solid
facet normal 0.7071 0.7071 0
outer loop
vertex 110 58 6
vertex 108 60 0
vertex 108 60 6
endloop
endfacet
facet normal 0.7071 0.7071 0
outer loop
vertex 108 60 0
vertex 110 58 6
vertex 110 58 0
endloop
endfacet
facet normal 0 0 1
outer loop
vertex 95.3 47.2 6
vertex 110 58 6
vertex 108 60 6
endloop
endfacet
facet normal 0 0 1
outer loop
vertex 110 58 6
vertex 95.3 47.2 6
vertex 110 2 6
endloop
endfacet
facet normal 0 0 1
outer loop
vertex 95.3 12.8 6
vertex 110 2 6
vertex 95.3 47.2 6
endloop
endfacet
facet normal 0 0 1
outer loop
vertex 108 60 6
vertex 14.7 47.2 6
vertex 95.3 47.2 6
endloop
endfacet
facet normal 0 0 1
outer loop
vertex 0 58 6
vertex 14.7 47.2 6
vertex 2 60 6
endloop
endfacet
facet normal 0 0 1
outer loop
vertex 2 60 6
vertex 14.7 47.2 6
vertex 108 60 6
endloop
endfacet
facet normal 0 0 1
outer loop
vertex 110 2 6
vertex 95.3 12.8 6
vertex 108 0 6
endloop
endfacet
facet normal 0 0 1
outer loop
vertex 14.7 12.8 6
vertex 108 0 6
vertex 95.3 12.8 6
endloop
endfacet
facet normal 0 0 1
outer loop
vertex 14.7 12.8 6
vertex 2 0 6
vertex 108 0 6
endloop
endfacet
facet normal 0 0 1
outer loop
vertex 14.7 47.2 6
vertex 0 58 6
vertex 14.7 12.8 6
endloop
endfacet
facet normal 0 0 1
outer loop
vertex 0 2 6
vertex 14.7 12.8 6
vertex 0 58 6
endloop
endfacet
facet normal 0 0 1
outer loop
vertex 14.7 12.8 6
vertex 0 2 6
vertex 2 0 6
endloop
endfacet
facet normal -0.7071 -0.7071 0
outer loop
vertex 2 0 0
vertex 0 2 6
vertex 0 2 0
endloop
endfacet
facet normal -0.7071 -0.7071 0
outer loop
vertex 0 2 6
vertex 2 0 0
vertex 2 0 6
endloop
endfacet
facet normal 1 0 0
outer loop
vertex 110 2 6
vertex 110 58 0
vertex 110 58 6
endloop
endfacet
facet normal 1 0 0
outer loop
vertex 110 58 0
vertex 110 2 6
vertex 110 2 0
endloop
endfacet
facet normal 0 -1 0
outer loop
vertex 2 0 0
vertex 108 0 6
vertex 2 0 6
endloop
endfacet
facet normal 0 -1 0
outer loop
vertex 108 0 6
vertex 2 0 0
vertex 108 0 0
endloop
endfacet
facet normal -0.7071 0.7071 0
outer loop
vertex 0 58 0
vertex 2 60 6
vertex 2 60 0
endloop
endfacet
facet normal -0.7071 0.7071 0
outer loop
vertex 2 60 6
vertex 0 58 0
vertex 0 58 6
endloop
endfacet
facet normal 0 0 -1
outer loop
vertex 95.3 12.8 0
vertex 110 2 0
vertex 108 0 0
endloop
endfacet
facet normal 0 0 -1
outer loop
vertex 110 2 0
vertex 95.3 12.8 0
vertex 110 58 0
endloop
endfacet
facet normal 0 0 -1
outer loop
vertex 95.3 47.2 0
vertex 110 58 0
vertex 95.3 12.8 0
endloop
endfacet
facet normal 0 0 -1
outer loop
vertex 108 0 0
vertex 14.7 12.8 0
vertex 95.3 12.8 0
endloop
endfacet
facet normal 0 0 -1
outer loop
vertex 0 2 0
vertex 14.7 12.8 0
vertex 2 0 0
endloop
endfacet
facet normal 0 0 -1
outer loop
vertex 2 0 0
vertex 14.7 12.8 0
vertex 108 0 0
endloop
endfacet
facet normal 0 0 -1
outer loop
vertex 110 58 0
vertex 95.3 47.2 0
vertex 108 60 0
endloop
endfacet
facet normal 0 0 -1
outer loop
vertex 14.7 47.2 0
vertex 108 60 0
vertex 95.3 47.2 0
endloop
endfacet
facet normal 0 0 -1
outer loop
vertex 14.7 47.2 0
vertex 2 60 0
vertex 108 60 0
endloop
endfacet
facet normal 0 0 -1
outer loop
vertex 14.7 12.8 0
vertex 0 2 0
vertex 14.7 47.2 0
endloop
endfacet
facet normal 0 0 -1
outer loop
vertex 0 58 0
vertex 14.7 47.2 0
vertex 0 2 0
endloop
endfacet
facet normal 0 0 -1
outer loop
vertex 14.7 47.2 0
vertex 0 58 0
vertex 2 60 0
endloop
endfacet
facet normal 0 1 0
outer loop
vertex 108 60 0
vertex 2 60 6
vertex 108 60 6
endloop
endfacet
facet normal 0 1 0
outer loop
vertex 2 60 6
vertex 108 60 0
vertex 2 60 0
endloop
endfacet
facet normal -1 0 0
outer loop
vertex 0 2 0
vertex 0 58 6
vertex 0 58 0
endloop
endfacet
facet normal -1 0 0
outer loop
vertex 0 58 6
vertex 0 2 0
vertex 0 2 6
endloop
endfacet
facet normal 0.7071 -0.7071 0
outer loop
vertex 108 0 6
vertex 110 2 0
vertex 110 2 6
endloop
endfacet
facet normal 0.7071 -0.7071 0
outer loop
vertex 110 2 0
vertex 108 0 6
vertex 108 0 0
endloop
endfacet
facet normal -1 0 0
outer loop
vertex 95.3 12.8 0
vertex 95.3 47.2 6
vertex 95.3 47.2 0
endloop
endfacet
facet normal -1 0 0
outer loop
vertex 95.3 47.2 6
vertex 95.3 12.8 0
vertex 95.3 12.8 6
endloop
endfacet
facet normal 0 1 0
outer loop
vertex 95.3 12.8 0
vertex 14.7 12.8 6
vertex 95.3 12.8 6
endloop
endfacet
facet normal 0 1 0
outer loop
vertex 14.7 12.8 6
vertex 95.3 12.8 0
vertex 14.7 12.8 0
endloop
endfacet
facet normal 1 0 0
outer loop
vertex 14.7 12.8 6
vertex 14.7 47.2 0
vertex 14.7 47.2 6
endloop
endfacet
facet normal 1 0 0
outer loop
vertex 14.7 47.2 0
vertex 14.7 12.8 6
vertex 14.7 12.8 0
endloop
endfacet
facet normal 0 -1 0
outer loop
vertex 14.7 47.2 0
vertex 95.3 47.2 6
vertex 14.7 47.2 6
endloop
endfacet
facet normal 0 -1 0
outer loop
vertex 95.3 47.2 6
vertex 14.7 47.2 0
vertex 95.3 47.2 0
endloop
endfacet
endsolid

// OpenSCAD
$fn = 32;

// ----------------------------------------------------------------------
// Windowed plate: 1 voids, 110 x 60 x 6 mm
// ----------------------------------------------------------------------

// --- parameters (mm) ---
plate_l = 110;            // plate length, X
plate_w = 60;             // plate width, Y
plate_t = 6;              // plate thickness, Z
edge_margin = 8;          // wall from the plate edge to any window
win1_l = 80.6;            // window length
win1_w = 34.4;            // window width
depth_1 = 6;              // depth of void 1 (full thickness = through)
corner_c = 2;             // corner chamfer of the plate

profile = [[2, 0], [108, 0], [110, 2], [110, 58], [108, 60], [2, 60], [0, 58], [0, 2]];  // primary outline, 8 points, counter clockwise
void_1 = [[14.7, 12.8], [95.3, 12.8], [95.3, 47.2], [14.7, 47.2]];  // large central window, 4 points

// --- the one profile operation ---
difference() {
  linear_extrude(height = plate_t) polygon(points = profile);
  translate([0, 0, -1])
    linear_extrude(height = plate_t + 2) polygon(points = void_1);
}
